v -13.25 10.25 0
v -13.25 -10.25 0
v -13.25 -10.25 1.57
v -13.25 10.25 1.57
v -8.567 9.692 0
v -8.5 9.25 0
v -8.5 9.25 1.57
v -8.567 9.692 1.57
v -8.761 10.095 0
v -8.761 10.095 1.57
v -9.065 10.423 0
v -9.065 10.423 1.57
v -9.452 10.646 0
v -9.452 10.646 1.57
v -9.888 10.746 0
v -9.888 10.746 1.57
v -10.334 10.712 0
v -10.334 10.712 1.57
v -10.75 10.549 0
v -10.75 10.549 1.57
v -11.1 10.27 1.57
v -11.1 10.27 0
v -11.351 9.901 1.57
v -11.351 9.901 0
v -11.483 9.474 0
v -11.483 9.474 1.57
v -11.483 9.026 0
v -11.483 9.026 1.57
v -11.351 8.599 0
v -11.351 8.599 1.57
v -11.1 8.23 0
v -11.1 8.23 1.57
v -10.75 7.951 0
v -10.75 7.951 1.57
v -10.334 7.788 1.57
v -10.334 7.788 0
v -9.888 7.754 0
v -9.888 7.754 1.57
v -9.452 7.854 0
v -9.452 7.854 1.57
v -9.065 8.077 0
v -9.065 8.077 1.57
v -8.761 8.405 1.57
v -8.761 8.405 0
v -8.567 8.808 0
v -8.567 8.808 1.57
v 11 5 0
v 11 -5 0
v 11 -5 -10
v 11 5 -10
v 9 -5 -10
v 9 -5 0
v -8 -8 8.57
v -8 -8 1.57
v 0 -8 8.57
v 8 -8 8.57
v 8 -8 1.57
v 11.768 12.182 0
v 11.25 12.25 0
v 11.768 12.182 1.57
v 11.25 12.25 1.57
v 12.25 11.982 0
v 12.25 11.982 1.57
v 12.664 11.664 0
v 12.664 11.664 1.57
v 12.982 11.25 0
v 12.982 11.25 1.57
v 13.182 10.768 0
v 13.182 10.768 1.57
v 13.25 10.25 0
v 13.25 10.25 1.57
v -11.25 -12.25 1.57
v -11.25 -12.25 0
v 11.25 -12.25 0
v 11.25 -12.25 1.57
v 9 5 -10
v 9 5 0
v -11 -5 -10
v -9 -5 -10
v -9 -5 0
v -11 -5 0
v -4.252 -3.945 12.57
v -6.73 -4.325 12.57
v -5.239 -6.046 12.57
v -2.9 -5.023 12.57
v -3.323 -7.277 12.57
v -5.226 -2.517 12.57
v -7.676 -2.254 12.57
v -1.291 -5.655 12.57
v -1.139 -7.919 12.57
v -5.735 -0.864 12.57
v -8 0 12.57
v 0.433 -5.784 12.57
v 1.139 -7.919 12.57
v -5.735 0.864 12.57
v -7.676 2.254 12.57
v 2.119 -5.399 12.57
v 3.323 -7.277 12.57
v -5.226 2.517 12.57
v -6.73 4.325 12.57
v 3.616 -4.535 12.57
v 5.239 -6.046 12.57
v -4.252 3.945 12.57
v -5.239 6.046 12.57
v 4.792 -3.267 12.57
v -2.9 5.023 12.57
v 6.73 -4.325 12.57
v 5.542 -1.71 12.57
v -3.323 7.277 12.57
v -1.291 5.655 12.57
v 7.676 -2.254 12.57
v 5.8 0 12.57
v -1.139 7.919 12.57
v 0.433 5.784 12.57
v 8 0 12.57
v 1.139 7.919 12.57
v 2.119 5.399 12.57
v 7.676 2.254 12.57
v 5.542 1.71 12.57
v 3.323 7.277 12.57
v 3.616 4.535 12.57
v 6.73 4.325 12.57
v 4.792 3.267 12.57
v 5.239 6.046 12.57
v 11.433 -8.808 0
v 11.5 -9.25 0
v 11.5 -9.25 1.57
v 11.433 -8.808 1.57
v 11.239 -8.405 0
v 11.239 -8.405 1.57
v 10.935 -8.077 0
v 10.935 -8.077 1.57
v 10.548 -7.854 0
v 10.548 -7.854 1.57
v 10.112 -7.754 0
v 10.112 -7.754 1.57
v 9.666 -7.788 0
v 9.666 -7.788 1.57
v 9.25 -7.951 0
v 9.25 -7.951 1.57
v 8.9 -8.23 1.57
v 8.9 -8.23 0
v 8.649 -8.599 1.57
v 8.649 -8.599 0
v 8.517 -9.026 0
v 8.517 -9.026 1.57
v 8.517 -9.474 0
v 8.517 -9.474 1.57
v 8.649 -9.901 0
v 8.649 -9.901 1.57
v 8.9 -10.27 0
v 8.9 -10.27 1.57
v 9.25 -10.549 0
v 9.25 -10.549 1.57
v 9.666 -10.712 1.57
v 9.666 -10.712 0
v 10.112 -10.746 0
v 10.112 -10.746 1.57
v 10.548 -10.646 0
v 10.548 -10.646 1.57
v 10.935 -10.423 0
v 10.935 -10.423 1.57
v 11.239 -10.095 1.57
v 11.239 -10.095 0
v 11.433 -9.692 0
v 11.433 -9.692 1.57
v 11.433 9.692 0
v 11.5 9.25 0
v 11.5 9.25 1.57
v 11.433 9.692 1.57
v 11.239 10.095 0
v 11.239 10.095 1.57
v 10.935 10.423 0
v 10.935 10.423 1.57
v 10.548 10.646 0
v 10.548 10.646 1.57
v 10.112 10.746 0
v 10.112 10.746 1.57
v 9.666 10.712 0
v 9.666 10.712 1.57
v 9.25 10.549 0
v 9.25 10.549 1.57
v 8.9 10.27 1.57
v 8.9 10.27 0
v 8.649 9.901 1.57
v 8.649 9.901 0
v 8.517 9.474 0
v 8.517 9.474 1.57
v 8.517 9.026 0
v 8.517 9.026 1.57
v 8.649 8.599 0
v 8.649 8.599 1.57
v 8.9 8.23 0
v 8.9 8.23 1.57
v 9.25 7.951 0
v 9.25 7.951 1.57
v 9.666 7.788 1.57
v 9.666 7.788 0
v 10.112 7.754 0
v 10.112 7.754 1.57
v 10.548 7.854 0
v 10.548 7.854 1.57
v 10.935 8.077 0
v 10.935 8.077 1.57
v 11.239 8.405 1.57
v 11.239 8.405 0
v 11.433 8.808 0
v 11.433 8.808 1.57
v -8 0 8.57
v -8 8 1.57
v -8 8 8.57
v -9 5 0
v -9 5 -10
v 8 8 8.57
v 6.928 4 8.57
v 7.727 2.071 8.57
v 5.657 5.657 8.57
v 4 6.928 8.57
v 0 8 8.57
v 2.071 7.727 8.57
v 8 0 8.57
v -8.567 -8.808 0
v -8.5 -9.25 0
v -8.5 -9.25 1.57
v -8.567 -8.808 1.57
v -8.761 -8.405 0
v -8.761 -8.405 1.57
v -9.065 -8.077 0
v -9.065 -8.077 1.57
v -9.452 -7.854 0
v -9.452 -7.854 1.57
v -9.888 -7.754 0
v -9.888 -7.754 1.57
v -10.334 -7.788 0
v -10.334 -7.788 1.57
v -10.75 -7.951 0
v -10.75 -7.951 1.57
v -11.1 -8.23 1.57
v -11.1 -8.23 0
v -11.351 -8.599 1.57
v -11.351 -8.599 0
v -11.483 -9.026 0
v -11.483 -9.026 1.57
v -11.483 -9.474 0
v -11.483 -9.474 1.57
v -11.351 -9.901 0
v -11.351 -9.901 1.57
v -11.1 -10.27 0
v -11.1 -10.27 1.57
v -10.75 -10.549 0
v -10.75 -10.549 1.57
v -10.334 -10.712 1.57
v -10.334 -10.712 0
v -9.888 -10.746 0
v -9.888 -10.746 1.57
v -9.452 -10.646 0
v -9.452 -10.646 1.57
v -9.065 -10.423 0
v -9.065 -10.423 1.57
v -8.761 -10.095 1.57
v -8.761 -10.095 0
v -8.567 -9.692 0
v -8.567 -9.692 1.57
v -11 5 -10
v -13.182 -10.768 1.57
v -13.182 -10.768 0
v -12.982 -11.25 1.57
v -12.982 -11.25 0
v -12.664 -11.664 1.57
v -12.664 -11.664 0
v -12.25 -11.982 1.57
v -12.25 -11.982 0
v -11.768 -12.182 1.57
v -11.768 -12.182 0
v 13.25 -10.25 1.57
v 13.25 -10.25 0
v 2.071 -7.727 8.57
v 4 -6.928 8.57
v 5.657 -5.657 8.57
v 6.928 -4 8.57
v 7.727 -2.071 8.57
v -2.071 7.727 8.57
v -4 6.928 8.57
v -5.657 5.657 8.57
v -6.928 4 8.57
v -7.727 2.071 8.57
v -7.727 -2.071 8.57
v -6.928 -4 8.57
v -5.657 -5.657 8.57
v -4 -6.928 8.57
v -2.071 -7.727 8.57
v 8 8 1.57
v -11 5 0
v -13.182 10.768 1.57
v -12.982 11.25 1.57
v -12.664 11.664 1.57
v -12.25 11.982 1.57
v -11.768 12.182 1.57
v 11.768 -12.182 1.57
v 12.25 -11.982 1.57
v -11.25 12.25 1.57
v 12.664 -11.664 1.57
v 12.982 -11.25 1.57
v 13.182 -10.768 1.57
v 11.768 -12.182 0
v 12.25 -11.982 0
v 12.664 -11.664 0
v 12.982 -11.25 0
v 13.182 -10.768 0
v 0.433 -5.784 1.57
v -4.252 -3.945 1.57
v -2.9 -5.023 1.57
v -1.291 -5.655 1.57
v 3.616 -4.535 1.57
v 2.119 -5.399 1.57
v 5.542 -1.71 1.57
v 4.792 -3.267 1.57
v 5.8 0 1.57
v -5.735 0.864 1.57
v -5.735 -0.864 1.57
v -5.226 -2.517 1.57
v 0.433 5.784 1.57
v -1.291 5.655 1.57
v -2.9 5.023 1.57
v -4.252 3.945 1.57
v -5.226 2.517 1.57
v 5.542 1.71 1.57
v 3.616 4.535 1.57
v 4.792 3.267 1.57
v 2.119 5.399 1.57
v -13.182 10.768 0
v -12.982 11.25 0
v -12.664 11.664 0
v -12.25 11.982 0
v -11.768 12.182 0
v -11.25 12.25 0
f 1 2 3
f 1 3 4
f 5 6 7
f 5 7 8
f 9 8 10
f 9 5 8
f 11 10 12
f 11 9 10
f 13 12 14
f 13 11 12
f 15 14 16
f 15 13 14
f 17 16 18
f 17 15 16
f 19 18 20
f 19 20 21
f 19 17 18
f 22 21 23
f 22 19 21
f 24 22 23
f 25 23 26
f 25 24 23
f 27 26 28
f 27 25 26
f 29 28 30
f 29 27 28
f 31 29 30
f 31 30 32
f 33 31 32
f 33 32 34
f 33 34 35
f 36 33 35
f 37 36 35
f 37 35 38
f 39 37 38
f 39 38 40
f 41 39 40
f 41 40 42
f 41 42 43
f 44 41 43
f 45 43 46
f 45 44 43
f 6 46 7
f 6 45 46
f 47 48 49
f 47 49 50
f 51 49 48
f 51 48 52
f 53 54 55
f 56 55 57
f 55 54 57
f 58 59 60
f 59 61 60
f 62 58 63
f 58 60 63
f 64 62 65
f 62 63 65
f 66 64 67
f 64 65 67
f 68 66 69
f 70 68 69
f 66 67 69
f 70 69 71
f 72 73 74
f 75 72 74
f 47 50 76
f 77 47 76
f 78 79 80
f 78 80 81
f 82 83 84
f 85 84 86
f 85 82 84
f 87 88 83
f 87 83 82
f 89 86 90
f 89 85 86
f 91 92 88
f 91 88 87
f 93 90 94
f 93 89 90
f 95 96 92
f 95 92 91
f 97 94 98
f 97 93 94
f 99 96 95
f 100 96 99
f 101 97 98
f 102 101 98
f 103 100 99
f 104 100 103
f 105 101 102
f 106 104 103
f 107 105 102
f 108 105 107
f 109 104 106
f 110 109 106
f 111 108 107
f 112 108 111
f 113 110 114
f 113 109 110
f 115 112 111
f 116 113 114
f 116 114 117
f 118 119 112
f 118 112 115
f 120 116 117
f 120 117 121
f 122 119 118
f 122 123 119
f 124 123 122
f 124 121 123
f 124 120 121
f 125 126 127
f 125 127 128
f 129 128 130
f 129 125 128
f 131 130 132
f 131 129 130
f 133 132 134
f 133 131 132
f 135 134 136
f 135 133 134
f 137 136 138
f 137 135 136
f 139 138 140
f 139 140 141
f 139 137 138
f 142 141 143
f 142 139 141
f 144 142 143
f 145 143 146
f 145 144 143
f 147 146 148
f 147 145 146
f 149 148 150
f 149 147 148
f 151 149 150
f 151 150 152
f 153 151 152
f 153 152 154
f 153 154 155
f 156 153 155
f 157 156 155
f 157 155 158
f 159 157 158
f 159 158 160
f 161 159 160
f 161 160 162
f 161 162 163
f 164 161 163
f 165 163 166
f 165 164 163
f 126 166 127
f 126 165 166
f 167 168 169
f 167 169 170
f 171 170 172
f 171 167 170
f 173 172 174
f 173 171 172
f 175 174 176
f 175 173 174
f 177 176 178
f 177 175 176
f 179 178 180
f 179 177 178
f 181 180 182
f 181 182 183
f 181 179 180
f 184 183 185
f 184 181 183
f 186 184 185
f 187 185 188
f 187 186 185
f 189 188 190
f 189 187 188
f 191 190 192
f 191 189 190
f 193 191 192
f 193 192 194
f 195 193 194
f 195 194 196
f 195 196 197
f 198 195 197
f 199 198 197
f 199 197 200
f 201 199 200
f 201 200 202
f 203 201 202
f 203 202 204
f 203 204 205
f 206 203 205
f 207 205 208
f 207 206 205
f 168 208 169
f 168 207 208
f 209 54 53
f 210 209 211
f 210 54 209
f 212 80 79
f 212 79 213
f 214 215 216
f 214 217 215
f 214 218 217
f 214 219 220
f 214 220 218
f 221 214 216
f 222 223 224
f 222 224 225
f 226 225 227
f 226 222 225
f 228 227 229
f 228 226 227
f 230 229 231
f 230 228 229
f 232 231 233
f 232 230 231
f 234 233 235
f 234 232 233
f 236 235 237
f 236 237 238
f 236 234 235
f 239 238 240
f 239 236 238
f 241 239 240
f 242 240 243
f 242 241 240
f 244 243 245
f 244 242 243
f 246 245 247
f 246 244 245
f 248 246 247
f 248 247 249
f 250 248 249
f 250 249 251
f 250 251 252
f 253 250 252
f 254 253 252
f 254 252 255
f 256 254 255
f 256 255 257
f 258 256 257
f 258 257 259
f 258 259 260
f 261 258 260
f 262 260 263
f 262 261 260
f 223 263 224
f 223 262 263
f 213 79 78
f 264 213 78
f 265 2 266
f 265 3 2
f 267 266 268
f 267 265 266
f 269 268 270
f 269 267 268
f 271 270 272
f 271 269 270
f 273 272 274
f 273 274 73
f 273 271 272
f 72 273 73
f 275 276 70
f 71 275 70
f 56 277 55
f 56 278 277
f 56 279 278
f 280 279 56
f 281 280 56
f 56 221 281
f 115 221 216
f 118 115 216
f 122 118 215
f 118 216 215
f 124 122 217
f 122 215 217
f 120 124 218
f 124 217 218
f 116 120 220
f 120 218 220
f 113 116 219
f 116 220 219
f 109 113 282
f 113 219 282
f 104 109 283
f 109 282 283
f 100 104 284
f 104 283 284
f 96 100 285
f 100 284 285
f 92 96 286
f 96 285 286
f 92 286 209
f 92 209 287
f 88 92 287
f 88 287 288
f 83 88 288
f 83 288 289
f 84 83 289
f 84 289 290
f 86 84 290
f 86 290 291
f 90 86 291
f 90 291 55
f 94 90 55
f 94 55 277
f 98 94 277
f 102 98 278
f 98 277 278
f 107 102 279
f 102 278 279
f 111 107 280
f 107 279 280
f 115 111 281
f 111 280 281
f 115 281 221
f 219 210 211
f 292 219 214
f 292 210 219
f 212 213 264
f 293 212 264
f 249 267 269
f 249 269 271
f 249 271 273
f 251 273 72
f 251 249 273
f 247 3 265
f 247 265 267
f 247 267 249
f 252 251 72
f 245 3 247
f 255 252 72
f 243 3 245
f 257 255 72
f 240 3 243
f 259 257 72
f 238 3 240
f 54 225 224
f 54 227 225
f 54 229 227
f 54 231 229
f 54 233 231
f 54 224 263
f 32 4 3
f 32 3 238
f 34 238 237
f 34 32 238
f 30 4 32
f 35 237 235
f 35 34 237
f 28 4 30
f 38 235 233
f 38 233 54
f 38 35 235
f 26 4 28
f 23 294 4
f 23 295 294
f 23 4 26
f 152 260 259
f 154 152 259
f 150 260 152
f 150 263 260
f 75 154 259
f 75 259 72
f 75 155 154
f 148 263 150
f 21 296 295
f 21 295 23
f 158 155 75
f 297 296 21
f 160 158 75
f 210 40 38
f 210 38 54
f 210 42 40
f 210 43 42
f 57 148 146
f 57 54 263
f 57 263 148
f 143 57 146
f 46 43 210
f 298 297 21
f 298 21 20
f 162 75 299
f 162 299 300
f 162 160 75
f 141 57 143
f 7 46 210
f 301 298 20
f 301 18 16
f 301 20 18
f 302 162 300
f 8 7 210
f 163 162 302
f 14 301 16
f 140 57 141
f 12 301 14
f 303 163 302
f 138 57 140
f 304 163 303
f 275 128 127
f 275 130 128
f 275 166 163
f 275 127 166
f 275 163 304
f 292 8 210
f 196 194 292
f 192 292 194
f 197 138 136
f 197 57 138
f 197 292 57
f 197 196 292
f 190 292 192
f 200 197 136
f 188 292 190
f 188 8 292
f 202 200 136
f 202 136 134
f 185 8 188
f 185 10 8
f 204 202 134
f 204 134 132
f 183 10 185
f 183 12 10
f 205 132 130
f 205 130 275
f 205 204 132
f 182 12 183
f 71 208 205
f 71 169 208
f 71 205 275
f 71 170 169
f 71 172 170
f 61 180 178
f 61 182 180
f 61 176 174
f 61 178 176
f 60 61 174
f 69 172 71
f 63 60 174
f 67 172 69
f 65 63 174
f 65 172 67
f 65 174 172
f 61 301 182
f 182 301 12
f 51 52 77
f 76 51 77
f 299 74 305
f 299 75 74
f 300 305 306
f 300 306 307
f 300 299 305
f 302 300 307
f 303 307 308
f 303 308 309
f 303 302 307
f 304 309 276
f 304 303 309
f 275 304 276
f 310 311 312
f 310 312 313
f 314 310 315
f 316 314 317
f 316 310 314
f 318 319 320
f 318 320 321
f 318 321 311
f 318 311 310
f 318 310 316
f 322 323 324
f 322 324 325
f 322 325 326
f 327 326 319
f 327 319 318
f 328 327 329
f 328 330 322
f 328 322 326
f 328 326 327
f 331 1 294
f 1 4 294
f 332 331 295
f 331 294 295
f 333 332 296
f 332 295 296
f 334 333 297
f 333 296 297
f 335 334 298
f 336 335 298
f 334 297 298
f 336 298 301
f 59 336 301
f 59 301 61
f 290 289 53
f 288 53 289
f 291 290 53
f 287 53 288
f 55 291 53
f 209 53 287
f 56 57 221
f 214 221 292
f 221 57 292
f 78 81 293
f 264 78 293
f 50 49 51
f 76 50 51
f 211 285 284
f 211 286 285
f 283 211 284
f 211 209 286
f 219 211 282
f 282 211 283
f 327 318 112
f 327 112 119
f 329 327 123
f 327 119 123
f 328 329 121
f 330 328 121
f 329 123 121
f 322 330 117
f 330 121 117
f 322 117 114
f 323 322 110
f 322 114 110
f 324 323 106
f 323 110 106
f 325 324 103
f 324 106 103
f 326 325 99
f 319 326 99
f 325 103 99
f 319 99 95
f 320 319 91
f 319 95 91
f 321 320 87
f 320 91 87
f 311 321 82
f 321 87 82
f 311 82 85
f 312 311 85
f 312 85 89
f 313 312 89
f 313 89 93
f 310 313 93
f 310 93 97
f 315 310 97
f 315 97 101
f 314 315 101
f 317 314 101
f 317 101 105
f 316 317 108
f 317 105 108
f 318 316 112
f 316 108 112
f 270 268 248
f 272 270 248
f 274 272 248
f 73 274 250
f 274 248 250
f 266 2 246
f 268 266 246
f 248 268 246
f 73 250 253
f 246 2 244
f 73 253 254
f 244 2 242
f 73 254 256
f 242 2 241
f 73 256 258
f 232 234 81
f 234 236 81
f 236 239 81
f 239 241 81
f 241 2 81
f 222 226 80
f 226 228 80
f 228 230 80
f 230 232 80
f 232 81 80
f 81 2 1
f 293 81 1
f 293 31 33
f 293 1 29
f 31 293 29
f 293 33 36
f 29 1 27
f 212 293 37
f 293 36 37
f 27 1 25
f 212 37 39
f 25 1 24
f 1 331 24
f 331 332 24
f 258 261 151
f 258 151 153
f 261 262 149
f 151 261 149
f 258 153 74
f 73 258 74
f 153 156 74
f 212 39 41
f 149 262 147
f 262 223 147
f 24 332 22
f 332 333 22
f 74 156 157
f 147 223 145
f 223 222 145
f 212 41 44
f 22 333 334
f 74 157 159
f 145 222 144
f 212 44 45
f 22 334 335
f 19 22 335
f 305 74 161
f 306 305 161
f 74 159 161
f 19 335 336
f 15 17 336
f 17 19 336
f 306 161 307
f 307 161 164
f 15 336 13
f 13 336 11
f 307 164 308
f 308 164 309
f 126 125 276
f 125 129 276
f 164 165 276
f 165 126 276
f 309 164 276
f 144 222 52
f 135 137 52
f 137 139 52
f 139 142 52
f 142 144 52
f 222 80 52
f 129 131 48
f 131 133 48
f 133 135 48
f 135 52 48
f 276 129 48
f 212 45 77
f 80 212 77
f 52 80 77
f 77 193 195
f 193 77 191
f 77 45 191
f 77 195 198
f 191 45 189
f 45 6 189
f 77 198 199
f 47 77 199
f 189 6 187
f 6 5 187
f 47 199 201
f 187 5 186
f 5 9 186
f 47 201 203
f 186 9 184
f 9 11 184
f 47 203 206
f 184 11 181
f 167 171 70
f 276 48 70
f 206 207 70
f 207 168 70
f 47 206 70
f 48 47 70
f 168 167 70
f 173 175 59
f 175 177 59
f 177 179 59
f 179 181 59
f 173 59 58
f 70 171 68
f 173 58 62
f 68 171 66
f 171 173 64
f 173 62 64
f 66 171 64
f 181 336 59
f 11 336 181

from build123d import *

# Parameters (mm, degrees)
SKETCH_1_W          = 26.5
SKETCH_1_H          = 24.5
SKETCH_1_R          = 1.5
EXTRUDE_1_DEPTH     = 1.57
SKETCH_3_W          = 16
SKETCH_3_H          = 16
EXTRUDE_2_DEPTH     = 7
SKETCH_4_R          = 8
EXTRUDE_3_DEPTH     = 4
SKETCH_5_R          = 5.8
CUT_EXTRUDE_1_DEPTH = 11
FILLET_1_R          = 2
SKETCH_6_W          = 2
SKETCH_6_H          = 10
EXTRUDE_4_DEPTH     = 10


with BuildPart() as part:
    # 草图1 → 凸台-拉伸1 (new body)
    with BuildSketch(Plane.XY):
        Rectangle(SKETCH_1_W, SKETCH_1_H)
        with Locations((-10, 9.25)):
            Circle(SKETCH_1_R, mode=Mode.SUBTRACT)
        with Locations((10, 9.25)):
            Circle(SKETCH_1_R, mode=Mode.SUBTRACT)
        with Locations((10, -9.25)):
            Circle(SKETCH_1_R, mode=Mode.SUBTRACT)
        with Locations((-10, -9.25)):
            Circle(SKETCH_1_R, mode=Mode.SUBTRACT)
    extrude(amount=EXTRUDE_1_DEPTH)

    # 草图3 → 凸台-拉伸2 (add)
    with BuildSketch(Plane.XY.offset(1.57)):
        Rectangle(SKETCH_3_W, SKETCH_3_H)
    extrude(amount=EXTRUDE_2_DEPTH)

    # 草图4 → 凸台-拉伸3 (add)
    with BuildSketch(Plane.XY.offset(8.57)):
        Circle(SKETCH_4_R)
    extrude(amount=EXTRUDE_3_DEPTH)

    # 草图5 → 切除-拉伸1 (cut)
    with BuildSketch(Plane.XY.offset(12.57)):
        Circle(SKETCH_5_R)
    extrude(amount=-CUT_EXTRUDE_1_DEPTH, mode=Mode.SUBTRACT)

    # 圆角1
    fillet_1_edges = [part.edges().sort_by_distance(p)[0] for p in [
        (13.25, -12.25, 0.785),
        (-13.25, -12.25, 0.785),
        (-13.25, 12.25, 0.785),
        (13.25, 12.25, 0.785),
    ]]
    fillet(fillet_1_edges, radius=FILLET_1_R)

    # 草图6 → 凸台-拉伸4 (add)
    with BuildSketch(Plane(origin=(0, 0, 0), x_dir=(-1, 0, 0), z_dir=(0, 0, -1))):
        with Locations((-10, 0)):
            Rectangle(SKETCH_6_W, SKETCH_6_H)
        with Locations((10, 0)):
            Rectangle(SKETCH_6_W, SKETCH_6_H)
    extrude(amount=EXTRUDE_4_DEPTH)


solid = part.part
